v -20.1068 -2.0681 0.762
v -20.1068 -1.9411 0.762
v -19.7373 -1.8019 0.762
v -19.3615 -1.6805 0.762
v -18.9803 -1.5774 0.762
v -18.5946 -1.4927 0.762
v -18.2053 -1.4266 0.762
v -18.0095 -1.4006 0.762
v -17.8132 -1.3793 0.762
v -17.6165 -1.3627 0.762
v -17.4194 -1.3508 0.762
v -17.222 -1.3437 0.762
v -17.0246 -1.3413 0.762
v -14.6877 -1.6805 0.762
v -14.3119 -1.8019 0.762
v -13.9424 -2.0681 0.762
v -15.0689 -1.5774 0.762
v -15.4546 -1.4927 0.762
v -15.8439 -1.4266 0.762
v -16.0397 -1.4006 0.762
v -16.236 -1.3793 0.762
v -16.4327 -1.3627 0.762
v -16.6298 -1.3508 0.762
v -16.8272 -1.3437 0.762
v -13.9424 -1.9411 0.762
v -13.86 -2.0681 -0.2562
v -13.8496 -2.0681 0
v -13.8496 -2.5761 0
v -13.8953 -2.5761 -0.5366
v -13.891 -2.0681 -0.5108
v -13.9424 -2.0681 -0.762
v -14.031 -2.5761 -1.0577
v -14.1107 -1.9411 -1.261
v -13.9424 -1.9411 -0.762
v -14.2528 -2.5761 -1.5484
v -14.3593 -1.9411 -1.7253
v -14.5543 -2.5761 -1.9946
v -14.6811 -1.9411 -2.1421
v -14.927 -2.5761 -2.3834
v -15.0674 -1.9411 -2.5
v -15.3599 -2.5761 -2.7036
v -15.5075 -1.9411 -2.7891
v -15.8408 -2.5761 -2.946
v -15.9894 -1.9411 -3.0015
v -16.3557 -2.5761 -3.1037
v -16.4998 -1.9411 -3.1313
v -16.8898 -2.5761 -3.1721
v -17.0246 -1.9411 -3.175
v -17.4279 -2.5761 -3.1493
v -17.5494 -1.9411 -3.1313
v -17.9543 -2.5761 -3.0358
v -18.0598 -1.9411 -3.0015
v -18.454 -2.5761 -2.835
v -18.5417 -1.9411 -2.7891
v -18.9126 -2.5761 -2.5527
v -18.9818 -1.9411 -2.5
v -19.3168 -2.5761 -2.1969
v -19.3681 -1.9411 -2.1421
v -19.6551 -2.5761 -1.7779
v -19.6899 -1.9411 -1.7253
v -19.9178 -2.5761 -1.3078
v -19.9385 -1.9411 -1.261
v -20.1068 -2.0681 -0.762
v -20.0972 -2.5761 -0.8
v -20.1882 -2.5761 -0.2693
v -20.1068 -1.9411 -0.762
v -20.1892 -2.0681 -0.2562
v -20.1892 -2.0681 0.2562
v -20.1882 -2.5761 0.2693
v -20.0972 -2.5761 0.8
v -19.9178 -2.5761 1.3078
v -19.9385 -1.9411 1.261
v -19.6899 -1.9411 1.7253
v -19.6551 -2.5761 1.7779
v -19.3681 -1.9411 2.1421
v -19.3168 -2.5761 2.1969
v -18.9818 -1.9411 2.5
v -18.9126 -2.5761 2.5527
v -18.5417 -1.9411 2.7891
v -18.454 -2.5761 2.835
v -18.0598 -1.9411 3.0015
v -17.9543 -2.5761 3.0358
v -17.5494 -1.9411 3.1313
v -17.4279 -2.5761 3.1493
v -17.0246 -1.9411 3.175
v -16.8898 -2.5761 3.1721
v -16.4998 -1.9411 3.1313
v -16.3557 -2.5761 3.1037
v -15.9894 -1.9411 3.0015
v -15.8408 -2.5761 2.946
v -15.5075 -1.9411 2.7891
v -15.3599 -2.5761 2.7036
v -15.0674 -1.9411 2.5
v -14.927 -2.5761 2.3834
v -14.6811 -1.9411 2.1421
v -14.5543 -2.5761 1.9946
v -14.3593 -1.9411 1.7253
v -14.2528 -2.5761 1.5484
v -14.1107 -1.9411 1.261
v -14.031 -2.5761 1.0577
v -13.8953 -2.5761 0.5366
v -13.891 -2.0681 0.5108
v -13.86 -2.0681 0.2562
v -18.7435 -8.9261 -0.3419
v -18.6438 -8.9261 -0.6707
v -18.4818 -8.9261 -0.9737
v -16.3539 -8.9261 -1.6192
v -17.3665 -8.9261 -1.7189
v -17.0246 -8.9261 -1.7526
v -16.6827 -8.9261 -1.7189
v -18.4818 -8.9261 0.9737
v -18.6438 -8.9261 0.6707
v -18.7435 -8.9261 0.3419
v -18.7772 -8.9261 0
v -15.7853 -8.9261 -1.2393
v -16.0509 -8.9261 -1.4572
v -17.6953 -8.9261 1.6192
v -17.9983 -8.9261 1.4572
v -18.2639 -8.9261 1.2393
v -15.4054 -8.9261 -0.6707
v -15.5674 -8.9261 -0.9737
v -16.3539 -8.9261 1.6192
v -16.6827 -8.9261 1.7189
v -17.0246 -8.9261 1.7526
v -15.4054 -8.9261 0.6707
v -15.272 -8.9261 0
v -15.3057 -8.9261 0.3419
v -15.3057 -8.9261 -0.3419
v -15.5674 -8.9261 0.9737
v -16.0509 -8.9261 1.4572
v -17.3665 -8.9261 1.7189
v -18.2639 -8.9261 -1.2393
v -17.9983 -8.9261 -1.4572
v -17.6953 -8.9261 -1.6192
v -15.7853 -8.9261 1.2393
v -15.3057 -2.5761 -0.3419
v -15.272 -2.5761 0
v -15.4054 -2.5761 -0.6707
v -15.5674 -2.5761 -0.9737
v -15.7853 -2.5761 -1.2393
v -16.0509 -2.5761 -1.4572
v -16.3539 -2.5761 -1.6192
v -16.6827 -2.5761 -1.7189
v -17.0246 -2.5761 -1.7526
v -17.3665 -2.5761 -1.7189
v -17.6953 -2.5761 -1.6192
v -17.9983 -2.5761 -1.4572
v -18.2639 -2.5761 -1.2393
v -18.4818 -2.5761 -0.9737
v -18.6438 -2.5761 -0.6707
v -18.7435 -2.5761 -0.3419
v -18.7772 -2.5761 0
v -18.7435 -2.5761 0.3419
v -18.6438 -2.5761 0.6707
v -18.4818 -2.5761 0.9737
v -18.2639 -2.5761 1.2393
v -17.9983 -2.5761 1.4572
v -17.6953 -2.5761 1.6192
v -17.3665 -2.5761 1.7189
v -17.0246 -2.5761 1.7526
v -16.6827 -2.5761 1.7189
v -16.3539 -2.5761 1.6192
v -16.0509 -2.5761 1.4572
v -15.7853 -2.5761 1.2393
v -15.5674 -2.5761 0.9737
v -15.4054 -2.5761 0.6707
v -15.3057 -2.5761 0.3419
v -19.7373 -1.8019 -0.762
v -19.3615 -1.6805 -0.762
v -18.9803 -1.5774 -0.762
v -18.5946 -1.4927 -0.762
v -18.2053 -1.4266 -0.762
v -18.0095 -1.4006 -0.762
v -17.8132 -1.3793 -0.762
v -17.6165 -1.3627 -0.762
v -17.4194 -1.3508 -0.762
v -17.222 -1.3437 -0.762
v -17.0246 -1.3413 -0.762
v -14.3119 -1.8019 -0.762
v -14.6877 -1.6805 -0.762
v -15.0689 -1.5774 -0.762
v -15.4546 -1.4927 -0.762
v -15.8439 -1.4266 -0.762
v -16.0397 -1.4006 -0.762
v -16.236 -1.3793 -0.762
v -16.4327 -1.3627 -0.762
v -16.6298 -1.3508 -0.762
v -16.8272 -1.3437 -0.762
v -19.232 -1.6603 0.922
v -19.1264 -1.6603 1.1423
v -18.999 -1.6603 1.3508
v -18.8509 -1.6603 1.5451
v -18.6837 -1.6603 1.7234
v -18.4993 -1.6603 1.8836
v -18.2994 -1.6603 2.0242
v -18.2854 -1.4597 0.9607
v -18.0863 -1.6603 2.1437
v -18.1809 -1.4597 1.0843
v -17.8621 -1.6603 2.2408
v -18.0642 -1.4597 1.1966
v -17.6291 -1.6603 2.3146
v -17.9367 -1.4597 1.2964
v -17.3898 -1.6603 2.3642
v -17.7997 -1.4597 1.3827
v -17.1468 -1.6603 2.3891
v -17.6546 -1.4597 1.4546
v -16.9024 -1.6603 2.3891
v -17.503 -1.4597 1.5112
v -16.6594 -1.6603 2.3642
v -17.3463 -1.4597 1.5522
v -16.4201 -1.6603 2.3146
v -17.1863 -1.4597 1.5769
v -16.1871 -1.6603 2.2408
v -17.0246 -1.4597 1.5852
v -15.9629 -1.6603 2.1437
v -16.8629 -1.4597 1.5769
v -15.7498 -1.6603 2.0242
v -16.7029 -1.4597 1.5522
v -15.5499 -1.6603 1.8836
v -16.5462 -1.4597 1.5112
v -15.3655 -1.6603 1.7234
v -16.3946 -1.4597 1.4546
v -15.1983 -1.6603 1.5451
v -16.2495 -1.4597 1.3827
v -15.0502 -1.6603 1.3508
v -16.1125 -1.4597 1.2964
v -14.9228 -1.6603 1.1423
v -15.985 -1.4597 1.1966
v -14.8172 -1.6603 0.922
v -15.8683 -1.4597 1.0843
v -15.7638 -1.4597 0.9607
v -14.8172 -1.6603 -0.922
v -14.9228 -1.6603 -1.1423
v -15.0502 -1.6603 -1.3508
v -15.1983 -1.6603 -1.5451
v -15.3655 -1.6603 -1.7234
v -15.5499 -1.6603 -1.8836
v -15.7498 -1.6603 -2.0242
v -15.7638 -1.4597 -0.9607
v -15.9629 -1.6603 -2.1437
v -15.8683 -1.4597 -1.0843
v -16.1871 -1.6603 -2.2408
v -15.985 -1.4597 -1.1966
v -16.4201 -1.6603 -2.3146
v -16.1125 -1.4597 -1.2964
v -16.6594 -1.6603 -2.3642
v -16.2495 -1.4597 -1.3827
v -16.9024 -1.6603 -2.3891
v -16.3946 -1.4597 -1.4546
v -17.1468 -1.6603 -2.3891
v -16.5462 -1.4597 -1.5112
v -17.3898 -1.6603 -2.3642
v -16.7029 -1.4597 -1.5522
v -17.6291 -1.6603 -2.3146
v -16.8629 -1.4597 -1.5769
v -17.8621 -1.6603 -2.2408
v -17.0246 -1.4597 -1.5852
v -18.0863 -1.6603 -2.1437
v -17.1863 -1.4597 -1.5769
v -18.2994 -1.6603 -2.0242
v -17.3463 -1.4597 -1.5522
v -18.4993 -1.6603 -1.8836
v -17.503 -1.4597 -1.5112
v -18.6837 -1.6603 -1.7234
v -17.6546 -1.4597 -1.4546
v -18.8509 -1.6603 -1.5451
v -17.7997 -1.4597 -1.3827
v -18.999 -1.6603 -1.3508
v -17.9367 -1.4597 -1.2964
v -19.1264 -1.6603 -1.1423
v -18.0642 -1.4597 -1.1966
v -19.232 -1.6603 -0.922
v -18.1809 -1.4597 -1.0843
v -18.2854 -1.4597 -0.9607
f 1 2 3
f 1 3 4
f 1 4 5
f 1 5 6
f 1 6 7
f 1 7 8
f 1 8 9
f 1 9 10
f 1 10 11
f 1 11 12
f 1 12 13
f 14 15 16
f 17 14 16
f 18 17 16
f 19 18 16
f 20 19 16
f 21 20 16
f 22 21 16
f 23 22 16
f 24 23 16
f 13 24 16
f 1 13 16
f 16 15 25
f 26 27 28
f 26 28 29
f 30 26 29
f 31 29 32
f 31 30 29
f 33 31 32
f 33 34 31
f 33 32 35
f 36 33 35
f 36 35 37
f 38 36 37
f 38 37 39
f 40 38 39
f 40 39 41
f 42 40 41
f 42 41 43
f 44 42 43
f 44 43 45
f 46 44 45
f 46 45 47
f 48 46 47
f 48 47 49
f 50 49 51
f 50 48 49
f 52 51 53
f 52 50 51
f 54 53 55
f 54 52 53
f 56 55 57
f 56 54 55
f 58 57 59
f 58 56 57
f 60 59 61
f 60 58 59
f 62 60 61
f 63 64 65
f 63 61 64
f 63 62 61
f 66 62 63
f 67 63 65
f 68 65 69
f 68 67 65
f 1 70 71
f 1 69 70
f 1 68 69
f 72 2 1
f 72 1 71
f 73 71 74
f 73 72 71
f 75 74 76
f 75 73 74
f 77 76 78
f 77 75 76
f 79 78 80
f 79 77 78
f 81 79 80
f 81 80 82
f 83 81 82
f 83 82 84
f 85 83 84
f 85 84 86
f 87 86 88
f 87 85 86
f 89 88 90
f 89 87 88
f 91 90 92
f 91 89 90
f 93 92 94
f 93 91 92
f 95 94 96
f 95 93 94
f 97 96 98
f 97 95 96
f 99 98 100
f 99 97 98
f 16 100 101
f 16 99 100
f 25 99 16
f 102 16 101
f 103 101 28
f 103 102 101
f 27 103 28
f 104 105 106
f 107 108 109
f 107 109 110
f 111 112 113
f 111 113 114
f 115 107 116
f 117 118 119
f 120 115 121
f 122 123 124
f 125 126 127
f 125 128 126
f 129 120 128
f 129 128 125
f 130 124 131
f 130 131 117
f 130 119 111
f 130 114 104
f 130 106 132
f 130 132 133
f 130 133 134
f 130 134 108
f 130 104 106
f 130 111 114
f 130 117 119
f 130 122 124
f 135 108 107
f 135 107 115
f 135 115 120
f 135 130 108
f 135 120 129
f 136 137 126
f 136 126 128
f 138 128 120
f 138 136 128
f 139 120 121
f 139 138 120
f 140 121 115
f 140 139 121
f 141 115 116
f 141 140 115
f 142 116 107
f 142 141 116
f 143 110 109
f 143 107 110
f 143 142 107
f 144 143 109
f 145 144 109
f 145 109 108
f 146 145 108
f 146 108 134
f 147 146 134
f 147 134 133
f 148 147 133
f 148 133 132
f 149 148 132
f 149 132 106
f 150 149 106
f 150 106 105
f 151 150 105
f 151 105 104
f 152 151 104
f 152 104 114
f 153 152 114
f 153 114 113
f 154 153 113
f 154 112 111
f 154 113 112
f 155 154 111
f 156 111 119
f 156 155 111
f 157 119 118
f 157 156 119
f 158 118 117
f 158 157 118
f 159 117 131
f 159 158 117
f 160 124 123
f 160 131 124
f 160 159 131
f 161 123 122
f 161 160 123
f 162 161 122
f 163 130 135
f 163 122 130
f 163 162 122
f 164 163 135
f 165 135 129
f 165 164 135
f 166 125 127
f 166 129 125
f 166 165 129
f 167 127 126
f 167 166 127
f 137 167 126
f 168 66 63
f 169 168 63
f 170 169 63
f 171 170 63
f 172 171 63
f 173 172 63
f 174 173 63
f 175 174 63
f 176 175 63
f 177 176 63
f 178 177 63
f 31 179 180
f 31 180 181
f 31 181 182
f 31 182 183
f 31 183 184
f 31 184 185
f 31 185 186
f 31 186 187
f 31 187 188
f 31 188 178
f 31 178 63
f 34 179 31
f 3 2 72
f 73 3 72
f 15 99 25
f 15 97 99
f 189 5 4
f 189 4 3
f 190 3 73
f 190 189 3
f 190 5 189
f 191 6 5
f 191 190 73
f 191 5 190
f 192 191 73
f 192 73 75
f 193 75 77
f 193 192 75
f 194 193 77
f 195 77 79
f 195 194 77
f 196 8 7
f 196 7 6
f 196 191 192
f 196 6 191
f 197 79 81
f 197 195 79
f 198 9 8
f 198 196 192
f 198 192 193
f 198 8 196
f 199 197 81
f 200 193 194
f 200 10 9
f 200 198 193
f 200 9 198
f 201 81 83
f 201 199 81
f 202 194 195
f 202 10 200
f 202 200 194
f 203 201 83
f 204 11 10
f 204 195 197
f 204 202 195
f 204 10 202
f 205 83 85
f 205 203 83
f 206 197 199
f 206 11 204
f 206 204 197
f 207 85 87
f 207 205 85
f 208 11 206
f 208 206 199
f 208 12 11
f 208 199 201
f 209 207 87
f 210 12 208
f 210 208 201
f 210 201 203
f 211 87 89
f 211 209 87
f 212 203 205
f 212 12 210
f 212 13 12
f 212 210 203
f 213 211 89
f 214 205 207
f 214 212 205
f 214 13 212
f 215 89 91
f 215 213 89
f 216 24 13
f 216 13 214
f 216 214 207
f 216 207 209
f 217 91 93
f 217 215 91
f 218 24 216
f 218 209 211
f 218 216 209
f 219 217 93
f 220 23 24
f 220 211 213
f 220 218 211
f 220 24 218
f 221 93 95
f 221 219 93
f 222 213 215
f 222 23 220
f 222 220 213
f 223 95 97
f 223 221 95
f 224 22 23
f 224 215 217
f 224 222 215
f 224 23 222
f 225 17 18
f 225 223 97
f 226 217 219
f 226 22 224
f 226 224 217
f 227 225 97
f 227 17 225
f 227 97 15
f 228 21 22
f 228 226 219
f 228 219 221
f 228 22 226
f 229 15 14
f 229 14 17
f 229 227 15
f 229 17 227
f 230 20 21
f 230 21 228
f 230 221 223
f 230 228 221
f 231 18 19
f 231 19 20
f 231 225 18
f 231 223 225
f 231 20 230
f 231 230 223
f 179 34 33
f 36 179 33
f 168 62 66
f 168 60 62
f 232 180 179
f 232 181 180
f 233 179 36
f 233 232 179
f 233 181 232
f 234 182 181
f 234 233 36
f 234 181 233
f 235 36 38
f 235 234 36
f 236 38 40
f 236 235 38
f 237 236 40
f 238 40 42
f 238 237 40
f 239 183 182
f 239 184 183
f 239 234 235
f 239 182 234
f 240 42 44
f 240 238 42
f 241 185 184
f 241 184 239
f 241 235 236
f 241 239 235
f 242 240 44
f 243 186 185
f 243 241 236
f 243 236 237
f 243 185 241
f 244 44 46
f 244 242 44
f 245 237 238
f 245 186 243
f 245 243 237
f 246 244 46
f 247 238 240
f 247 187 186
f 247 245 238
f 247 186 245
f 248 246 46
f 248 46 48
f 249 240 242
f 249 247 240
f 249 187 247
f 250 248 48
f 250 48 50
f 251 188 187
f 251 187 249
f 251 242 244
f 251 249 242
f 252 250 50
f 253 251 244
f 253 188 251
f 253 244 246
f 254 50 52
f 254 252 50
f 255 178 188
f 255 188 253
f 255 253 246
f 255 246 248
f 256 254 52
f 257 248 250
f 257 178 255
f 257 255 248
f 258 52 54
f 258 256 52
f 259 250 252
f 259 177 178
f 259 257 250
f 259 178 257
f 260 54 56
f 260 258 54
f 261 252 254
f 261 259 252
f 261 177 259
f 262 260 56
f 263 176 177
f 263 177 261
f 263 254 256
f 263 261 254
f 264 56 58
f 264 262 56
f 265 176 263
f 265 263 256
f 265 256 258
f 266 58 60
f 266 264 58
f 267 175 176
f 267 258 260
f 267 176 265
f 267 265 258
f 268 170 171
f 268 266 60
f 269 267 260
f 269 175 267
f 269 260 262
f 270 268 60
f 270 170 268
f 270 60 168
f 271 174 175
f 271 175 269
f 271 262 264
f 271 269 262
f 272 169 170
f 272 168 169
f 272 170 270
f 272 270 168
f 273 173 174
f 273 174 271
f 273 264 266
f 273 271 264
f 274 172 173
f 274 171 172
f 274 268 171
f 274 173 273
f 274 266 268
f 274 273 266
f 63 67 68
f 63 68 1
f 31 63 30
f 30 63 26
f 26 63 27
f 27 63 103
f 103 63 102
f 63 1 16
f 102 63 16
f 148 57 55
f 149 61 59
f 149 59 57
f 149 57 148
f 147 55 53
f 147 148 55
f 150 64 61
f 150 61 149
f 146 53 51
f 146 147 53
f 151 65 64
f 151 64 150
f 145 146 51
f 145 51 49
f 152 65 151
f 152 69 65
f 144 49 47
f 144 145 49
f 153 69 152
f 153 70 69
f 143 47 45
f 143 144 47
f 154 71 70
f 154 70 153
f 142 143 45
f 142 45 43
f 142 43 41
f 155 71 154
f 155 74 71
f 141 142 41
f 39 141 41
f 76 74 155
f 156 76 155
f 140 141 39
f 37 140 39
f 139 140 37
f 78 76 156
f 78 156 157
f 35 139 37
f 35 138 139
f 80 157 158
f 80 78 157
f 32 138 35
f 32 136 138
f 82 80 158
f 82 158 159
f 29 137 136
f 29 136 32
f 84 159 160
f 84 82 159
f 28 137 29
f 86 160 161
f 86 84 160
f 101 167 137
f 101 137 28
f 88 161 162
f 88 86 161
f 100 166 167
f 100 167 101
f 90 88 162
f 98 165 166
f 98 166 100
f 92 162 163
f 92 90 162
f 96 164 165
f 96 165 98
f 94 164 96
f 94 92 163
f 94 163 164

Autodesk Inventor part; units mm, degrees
ref_plane "YZ Plane" through (0, 0, 0) normal (1, 0, 0) x (0, 1, 0)
ref_plane "XZ Plane" through (0, 0, 0) normal (0, 1, 0) x (-1, 0, 0)
ref_plane "XY Plane" through (0, 0, 0) normal (0, 0, 1) x (1, 0, 0)
sketch "Sketch1" plane through (0, 0, 0) normal (0, 0, 1) x (1, 0, 0)
  line L0 (-17.0246, -1.3061) -> (-17.0246, -8.9261)
  line L1 (-17.0246, -8.9261) -> (-15.272, -8.9261)
  line L2 (-15.272, -8.9261) -> (-15.272, -2.5761)
  line L3 (-15.272, -2.5761) -> (-13.8496, -2.5761)
  line L4 (-13.8496, -2.5761) -> (-13.8496, -1.9411)
  arc A0 (-13.8496, -1.9411) -> (-17.0246, -1.3061) centre (-17.0246, -9.5611) ccw
  dimension "length" = 6.35
  dimension "d1" = 0.635
  dimension "d2" = 1.27
  dimension "d3" = 1.7526
  dimension "d4" = 3.175
revolve "Revolution1" add sketch "Sketch1" angle 360 about axis through (-17.0246, -1.3061, 0) along (0, -1, 0)
ref_plane "Work Plane1" through (-17.0246, -1.3061, 0) normal (0, -1, 0) x (1, 0, 0)
sketch "Sketch2" plane through (-17.0246, -1.3061, 0) normal (0, -1, 0) x (1, 0, 0)
  line L0 (-3.0822, -0.762) -> (3.0822, -0.762)
  circle A0 centre (0, 0) radius 0.762 construction
  circle A1 centre (0, 0) radius 3.175 projected
  line L1 (-3.0822, 0.762) -> (3.0822, 0.762)
  dimension "d8" = 1.524
extrude "Extrusion1" cut sketch "Sketch2" along normal blind 0.762 contours A1 L1 L0
thread "Thread1" size "6-32 UNC" class "2A" standard "ANSI Unified Screw Threads" full length
properties part number "6-32bolt" material "Brass, Soft Yellow"
